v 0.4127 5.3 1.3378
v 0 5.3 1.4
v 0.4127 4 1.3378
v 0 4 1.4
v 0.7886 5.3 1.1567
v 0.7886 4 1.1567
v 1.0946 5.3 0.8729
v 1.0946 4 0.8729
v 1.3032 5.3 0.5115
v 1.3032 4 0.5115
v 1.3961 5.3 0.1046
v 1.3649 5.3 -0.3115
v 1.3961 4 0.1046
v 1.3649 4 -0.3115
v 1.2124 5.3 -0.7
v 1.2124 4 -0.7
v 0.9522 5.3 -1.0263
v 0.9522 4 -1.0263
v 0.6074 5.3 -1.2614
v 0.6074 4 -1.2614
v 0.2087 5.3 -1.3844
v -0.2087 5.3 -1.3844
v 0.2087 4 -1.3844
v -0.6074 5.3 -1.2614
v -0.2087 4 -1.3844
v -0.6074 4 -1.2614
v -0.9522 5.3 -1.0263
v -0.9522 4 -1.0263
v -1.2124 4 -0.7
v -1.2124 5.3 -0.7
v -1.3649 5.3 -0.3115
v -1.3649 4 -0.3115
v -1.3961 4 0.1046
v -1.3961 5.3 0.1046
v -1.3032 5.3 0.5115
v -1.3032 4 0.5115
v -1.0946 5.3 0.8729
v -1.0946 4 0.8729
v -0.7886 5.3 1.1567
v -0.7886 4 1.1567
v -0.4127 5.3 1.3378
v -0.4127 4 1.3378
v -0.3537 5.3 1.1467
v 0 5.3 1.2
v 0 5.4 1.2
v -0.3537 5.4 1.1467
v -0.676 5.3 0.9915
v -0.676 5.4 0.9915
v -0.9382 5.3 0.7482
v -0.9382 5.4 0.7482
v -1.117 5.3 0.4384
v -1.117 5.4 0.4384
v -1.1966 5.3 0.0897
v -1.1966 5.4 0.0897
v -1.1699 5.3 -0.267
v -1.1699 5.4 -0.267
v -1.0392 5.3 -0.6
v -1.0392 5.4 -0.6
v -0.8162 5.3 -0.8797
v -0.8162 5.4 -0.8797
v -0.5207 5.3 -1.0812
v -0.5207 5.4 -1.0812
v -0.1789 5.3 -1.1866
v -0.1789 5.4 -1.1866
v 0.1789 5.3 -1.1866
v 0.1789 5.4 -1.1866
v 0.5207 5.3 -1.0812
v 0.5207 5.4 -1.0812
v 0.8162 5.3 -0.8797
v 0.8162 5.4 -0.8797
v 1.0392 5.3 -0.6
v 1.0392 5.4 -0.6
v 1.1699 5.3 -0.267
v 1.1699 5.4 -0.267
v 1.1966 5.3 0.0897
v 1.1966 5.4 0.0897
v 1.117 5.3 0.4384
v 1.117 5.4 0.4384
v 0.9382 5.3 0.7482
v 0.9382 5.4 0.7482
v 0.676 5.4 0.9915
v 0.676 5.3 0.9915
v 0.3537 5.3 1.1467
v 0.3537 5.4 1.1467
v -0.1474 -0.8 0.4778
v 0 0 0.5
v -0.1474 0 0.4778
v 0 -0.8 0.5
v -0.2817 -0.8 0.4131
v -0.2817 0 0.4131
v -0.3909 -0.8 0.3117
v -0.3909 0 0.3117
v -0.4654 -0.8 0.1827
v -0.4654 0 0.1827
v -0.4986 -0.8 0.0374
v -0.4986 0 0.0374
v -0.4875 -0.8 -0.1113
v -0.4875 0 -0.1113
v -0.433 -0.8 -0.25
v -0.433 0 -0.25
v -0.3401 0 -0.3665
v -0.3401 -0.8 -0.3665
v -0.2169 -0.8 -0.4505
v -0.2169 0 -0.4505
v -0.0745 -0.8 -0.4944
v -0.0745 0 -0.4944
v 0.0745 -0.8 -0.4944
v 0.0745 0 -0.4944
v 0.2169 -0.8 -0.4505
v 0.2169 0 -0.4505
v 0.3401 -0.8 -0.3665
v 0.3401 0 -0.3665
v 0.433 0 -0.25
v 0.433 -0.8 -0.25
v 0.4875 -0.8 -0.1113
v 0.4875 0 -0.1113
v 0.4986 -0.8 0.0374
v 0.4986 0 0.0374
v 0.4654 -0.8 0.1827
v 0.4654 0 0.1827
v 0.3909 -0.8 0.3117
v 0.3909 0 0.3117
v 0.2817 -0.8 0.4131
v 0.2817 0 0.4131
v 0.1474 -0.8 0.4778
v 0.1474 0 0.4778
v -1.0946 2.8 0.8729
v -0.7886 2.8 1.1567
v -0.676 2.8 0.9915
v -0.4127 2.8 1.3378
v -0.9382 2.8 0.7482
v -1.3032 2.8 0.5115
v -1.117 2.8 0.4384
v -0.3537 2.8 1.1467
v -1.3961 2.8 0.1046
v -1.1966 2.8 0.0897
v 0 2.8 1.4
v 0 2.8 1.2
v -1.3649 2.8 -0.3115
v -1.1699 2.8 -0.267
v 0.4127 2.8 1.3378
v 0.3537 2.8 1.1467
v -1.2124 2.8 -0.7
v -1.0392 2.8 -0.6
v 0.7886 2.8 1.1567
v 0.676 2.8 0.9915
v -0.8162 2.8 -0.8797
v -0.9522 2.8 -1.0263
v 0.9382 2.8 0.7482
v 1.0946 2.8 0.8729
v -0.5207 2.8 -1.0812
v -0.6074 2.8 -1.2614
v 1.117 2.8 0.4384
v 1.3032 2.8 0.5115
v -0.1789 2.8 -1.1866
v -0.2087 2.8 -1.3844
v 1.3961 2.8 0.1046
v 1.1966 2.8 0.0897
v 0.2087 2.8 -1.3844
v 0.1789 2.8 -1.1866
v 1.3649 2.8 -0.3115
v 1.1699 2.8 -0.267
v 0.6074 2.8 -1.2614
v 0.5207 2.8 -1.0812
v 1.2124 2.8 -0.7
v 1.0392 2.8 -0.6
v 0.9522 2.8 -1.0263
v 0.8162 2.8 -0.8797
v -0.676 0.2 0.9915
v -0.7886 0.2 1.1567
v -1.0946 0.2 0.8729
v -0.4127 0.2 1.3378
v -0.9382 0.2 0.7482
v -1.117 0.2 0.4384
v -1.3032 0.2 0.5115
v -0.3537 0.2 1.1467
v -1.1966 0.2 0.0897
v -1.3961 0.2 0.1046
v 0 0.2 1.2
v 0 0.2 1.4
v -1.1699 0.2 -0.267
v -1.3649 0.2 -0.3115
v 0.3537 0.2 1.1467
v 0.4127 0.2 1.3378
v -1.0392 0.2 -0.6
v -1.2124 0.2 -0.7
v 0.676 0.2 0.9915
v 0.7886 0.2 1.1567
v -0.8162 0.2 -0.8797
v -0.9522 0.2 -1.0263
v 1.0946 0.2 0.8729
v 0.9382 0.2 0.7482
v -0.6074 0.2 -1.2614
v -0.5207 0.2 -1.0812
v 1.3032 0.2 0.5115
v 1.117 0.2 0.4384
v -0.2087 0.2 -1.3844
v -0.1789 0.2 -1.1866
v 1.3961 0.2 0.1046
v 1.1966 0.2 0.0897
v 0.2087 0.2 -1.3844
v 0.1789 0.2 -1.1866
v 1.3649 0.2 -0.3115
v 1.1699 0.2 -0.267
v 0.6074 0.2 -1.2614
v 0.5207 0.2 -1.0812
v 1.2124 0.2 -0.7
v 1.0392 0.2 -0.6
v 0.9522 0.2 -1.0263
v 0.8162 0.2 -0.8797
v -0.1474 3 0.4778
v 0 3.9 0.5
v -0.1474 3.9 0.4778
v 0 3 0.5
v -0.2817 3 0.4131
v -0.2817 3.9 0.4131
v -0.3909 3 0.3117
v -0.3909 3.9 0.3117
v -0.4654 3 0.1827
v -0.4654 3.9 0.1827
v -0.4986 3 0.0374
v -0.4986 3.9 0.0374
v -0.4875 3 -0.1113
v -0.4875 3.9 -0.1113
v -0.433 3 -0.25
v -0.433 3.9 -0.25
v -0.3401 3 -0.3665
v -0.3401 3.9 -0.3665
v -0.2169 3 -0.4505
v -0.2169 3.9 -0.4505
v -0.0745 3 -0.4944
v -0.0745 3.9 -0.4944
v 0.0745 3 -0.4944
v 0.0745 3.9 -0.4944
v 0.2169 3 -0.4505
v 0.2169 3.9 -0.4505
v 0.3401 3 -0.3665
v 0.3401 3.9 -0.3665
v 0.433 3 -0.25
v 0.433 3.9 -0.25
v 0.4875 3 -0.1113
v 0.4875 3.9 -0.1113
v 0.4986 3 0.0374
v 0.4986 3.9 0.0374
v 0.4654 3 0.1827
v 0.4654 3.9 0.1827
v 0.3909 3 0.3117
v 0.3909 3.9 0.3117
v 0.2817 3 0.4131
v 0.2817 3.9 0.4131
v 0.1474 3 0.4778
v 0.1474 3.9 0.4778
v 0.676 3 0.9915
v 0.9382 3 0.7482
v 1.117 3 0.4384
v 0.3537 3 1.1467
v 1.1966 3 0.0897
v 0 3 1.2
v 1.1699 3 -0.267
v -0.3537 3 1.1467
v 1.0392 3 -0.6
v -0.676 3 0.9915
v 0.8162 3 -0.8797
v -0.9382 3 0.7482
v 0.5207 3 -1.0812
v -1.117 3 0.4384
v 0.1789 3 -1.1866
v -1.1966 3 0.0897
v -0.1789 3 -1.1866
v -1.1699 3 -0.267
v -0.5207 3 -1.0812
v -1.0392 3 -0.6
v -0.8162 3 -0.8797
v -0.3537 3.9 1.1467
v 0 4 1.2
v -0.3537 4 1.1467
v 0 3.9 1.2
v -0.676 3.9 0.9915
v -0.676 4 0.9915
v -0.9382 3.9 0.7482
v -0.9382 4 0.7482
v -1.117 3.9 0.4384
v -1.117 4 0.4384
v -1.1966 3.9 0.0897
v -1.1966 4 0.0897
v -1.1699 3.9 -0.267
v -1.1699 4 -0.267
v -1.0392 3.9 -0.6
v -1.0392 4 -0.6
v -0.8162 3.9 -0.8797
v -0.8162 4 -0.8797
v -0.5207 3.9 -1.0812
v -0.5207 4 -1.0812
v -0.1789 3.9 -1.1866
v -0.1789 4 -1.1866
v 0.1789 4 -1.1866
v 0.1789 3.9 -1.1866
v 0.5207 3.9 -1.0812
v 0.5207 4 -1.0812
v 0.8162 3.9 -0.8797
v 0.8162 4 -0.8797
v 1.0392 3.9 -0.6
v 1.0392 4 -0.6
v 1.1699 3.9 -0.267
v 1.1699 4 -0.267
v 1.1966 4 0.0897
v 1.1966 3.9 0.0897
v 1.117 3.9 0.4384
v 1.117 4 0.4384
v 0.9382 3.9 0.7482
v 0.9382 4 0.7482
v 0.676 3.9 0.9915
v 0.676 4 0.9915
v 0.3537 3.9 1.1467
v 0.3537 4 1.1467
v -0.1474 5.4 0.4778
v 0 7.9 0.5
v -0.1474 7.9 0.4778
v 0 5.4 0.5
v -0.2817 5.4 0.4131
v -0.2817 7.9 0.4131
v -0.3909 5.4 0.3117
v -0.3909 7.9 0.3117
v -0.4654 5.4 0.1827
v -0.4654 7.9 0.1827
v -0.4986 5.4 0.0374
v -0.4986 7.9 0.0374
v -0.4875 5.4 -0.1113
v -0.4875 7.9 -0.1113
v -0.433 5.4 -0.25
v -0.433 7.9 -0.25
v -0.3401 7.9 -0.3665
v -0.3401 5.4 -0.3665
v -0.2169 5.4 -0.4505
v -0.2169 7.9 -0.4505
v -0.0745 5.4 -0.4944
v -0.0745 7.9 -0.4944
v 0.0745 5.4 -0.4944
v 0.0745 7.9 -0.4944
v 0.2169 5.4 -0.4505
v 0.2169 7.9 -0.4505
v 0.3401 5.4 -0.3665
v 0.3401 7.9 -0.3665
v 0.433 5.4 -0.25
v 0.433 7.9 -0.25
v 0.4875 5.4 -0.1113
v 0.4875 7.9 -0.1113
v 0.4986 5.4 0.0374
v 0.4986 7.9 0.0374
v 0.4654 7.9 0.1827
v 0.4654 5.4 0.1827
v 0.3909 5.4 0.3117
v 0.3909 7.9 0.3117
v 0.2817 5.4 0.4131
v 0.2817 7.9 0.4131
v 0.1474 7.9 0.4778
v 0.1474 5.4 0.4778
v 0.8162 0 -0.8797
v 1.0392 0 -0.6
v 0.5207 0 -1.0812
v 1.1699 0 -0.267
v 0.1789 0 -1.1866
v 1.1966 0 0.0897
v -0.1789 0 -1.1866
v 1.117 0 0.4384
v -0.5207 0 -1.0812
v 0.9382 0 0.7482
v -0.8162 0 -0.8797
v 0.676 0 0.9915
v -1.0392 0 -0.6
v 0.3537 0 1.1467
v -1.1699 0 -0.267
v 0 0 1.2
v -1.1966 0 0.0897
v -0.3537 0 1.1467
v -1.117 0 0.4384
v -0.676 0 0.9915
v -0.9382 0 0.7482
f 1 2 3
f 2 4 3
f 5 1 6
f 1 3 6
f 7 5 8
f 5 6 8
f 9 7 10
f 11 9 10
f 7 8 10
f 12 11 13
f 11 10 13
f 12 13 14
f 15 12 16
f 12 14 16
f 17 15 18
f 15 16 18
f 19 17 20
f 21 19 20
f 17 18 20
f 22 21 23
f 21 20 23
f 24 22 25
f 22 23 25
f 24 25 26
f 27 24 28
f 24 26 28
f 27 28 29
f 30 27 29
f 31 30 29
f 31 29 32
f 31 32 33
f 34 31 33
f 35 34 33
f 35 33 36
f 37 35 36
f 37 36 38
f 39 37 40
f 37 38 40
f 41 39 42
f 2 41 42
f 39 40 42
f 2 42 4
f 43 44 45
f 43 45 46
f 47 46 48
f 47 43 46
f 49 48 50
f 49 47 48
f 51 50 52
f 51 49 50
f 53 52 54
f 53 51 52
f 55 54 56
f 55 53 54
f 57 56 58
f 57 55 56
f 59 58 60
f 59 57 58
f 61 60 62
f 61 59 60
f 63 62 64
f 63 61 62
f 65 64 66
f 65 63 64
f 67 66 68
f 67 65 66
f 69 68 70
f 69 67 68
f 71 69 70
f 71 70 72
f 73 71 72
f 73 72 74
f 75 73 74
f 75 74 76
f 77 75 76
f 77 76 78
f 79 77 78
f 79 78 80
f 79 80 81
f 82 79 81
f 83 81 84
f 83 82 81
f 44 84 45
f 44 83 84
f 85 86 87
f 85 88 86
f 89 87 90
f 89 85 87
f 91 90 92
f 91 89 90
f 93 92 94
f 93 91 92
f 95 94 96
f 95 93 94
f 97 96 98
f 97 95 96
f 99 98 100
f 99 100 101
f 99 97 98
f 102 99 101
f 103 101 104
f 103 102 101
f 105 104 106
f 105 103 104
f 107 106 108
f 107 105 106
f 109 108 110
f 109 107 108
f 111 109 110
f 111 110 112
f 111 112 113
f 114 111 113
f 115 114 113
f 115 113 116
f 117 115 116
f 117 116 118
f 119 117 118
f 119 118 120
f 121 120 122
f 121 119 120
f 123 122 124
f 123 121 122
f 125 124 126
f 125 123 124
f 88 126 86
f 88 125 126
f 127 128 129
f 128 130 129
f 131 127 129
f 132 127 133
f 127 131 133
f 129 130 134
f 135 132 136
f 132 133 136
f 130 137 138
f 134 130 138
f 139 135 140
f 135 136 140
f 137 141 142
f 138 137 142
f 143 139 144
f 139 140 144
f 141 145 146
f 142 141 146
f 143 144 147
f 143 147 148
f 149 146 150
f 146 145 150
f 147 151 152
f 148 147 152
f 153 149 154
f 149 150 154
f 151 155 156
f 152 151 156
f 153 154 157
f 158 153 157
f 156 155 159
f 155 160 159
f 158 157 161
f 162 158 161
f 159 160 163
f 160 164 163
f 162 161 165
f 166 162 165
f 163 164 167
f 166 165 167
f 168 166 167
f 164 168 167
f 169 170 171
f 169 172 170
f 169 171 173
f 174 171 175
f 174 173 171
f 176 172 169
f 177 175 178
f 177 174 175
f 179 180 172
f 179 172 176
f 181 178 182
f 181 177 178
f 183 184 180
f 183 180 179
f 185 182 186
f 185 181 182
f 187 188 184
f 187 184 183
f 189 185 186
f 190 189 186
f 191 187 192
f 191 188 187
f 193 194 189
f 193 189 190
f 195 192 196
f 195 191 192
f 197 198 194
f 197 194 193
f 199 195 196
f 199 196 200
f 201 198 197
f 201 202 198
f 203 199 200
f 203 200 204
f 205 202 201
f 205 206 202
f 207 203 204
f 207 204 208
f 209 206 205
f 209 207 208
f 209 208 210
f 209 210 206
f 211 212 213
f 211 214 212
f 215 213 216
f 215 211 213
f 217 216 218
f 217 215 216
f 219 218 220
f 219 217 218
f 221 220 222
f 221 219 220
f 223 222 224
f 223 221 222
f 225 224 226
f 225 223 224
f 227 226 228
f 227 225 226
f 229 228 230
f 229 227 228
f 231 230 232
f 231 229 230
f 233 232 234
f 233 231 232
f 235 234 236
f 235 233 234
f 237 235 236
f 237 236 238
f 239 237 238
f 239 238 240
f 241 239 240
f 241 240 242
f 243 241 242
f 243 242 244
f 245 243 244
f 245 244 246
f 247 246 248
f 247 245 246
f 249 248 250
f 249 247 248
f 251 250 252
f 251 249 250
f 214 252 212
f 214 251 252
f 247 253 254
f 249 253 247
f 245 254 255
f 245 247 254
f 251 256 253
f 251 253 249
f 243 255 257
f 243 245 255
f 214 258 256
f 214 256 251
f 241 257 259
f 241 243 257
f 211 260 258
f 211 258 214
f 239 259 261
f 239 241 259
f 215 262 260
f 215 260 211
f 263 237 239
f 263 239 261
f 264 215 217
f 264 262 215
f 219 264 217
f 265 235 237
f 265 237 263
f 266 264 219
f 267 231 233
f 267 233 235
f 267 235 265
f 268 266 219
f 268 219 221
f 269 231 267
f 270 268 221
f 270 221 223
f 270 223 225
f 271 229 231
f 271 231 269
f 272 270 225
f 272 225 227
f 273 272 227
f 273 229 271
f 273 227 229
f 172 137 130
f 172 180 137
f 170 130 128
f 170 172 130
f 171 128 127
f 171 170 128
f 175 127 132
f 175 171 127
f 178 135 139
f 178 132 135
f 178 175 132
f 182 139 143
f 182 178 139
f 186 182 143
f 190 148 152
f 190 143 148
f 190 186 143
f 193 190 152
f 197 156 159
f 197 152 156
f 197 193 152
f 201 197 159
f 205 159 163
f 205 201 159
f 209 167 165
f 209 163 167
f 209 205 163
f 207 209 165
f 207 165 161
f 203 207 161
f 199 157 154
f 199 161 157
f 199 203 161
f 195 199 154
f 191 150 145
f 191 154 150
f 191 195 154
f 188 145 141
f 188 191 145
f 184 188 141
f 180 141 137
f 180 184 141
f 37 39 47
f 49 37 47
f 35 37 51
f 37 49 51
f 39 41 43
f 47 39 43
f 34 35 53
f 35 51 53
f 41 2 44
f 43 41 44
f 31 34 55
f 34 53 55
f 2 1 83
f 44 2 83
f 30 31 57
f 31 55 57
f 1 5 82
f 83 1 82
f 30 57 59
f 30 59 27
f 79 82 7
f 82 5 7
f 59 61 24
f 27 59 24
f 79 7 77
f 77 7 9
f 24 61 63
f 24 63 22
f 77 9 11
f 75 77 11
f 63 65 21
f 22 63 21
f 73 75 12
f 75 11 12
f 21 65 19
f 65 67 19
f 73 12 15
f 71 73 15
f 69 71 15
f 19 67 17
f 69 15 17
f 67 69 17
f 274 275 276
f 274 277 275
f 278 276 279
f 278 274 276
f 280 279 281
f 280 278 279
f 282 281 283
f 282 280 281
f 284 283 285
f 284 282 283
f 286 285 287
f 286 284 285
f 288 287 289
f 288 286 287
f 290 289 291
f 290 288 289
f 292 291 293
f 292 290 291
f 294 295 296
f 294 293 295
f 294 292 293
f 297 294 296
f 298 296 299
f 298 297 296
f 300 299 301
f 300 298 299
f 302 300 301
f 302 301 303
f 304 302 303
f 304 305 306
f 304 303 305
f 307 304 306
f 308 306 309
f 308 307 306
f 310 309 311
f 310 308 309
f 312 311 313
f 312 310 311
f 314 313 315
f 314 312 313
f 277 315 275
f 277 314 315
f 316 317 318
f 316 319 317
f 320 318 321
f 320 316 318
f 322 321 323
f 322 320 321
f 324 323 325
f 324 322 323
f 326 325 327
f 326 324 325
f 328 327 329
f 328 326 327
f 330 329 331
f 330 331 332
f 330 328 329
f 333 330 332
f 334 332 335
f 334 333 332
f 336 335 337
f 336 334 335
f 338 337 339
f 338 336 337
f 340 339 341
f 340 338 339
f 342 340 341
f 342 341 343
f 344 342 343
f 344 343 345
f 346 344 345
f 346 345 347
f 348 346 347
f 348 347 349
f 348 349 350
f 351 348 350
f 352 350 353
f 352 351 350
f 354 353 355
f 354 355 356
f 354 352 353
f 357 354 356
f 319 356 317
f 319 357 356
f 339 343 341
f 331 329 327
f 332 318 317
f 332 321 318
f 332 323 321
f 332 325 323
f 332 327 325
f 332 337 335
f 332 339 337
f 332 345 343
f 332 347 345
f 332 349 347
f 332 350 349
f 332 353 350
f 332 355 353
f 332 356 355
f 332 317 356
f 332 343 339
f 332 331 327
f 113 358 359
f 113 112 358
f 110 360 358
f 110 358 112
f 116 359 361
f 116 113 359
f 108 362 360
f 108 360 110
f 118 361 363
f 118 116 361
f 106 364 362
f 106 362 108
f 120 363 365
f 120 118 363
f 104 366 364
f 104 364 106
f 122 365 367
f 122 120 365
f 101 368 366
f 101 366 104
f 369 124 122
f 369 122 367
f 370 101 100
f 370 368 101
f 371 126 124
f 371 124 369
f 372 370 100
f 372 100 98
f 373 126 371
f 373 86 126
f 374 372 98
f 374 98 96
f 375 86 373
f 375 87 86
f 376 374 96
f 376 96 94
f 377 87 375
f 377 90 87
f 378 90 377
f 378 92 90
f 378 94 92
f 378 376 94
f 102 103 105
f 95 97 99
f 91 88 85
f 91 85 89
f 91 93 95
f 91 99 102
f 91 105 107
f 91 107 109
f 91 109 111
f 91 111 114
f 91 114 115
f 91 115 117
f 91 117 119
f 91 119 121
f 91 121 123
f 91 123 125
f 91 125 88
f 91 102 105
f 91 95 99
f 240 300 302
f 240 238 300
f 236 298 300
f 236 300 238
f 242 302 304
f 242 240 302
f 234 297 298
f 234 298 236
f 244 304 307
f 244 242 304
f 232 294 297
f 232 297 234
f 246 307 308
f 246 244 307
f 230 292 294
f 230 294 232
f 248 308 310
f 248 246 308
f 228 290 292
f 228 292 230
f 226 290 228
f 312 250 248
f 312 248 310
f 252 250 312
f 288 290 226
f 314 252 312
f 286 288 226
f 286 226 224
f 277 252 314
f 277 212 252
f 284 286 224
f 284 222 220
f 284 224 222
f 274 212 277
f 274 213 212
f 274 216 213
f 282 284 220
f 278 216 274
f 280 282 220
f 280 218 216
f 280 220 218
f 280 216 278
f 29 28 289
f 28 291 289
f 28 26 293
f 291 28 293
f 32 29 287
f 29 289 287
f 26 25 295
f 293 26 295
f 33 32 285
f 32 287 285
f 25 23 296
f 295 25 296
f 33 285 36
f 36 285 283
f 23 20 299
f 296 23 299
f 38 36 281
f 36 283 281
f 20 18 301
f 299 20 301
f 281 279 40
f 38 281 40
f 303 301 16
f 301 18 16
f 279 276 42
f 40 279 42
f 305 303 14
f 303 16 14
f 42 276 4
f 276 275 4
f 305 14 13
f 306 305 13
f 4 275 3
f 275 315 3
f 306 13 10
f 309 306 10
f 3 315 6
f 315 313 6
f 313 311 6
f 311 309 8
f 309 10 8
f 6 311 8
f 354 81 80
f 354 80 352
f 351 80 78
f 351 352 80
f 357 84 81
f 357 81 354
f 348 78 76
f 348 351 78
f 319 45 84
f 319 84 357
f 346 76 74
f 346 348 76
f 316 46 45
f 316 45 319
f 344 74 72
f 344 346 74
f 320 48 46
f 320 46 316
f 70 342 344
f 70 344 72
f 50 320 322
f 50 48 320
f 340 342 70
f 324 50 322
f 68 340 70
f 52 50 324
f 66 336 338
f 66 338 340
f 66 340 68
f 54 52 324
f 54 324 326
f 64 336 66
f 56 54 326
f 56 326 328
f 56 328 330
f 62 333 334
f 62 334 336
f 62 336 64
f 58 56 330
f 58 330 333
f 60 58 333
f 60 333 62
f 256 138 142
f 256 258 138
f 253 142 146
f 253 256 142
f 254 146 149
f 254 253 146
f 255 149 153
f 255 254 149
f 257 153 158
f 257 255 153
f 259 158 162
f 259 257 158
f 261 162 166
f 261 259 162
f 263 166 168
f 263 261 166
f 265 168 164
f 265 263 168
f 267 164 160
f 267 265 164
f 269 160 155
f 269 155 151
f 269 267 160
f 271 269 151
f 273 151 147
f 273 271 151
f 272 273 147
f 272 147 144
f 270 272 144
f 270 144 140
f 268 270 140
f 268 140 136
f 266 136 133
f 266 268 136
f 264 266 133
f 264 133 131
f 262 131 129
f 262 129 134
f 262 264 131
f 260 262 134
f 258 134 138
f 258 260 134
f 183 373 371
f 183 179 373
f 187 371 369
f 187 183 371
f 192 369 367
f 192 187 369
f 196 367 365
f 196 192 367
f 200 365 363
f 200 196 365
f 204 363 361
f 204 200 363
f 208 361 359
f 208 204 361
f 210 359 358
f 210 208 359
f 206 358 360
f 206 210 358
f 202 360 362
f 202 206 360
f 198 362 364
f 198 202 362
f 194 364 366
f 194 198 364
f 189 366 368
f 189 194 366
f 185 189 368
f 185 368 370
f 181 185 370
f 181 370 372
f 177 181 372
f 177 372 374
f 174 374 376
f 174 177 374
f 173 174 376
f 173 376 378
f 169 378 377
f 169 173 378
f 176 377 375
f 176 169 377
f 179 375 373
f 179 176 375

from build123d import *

# Parameters (mm, degrees)
F2_W = 0.2
F2_H = 0.2


with BuildPart() as f1:
    # F0 (on Right) → F1 (revolve)
    with BuildSketch(Plane.YZ):
        Polygon((-0.8, 0.5), (-0.8, 0), (7.9, 0), (7.9, 0.5), (5.4, 0.5), (5.4, 1.2), (3.9, 1.2), (3.9, 0.5), (3, 0.5), (3, 1.4), (0, 1.4), (0, 0.5), align=None)
    revolve(axis=Axis((0, 3.55, 0), (0, -1, 0)))

    # F2 (on Right) → F3 (revolve, cut)
    with BuildSketch(Plane.YZ):
        with Locations((2.9, 1.3)):
            Rectangle(F2_W, F2_H)
        with Locations((0.1, 1.3)):
            Rectangle(F2_W, F2_H)
    revolve(axis=Axis((0, 1.5, 0), (0, 1, 0)), mode=Mode.SUBTRACT)

    # F4 (on Right) → F5 (revolve)
    with BuildSketch(Plane.YZ):
        Polygon((4, 1.4), (4, 1.2), (4.9, 1.2), (5.3, 1.2), (5.3, 1.4), align=None)
    revolve(axis=Axis((0, 4.65, 0), (0, 1, 0)))


solid = f1.part
